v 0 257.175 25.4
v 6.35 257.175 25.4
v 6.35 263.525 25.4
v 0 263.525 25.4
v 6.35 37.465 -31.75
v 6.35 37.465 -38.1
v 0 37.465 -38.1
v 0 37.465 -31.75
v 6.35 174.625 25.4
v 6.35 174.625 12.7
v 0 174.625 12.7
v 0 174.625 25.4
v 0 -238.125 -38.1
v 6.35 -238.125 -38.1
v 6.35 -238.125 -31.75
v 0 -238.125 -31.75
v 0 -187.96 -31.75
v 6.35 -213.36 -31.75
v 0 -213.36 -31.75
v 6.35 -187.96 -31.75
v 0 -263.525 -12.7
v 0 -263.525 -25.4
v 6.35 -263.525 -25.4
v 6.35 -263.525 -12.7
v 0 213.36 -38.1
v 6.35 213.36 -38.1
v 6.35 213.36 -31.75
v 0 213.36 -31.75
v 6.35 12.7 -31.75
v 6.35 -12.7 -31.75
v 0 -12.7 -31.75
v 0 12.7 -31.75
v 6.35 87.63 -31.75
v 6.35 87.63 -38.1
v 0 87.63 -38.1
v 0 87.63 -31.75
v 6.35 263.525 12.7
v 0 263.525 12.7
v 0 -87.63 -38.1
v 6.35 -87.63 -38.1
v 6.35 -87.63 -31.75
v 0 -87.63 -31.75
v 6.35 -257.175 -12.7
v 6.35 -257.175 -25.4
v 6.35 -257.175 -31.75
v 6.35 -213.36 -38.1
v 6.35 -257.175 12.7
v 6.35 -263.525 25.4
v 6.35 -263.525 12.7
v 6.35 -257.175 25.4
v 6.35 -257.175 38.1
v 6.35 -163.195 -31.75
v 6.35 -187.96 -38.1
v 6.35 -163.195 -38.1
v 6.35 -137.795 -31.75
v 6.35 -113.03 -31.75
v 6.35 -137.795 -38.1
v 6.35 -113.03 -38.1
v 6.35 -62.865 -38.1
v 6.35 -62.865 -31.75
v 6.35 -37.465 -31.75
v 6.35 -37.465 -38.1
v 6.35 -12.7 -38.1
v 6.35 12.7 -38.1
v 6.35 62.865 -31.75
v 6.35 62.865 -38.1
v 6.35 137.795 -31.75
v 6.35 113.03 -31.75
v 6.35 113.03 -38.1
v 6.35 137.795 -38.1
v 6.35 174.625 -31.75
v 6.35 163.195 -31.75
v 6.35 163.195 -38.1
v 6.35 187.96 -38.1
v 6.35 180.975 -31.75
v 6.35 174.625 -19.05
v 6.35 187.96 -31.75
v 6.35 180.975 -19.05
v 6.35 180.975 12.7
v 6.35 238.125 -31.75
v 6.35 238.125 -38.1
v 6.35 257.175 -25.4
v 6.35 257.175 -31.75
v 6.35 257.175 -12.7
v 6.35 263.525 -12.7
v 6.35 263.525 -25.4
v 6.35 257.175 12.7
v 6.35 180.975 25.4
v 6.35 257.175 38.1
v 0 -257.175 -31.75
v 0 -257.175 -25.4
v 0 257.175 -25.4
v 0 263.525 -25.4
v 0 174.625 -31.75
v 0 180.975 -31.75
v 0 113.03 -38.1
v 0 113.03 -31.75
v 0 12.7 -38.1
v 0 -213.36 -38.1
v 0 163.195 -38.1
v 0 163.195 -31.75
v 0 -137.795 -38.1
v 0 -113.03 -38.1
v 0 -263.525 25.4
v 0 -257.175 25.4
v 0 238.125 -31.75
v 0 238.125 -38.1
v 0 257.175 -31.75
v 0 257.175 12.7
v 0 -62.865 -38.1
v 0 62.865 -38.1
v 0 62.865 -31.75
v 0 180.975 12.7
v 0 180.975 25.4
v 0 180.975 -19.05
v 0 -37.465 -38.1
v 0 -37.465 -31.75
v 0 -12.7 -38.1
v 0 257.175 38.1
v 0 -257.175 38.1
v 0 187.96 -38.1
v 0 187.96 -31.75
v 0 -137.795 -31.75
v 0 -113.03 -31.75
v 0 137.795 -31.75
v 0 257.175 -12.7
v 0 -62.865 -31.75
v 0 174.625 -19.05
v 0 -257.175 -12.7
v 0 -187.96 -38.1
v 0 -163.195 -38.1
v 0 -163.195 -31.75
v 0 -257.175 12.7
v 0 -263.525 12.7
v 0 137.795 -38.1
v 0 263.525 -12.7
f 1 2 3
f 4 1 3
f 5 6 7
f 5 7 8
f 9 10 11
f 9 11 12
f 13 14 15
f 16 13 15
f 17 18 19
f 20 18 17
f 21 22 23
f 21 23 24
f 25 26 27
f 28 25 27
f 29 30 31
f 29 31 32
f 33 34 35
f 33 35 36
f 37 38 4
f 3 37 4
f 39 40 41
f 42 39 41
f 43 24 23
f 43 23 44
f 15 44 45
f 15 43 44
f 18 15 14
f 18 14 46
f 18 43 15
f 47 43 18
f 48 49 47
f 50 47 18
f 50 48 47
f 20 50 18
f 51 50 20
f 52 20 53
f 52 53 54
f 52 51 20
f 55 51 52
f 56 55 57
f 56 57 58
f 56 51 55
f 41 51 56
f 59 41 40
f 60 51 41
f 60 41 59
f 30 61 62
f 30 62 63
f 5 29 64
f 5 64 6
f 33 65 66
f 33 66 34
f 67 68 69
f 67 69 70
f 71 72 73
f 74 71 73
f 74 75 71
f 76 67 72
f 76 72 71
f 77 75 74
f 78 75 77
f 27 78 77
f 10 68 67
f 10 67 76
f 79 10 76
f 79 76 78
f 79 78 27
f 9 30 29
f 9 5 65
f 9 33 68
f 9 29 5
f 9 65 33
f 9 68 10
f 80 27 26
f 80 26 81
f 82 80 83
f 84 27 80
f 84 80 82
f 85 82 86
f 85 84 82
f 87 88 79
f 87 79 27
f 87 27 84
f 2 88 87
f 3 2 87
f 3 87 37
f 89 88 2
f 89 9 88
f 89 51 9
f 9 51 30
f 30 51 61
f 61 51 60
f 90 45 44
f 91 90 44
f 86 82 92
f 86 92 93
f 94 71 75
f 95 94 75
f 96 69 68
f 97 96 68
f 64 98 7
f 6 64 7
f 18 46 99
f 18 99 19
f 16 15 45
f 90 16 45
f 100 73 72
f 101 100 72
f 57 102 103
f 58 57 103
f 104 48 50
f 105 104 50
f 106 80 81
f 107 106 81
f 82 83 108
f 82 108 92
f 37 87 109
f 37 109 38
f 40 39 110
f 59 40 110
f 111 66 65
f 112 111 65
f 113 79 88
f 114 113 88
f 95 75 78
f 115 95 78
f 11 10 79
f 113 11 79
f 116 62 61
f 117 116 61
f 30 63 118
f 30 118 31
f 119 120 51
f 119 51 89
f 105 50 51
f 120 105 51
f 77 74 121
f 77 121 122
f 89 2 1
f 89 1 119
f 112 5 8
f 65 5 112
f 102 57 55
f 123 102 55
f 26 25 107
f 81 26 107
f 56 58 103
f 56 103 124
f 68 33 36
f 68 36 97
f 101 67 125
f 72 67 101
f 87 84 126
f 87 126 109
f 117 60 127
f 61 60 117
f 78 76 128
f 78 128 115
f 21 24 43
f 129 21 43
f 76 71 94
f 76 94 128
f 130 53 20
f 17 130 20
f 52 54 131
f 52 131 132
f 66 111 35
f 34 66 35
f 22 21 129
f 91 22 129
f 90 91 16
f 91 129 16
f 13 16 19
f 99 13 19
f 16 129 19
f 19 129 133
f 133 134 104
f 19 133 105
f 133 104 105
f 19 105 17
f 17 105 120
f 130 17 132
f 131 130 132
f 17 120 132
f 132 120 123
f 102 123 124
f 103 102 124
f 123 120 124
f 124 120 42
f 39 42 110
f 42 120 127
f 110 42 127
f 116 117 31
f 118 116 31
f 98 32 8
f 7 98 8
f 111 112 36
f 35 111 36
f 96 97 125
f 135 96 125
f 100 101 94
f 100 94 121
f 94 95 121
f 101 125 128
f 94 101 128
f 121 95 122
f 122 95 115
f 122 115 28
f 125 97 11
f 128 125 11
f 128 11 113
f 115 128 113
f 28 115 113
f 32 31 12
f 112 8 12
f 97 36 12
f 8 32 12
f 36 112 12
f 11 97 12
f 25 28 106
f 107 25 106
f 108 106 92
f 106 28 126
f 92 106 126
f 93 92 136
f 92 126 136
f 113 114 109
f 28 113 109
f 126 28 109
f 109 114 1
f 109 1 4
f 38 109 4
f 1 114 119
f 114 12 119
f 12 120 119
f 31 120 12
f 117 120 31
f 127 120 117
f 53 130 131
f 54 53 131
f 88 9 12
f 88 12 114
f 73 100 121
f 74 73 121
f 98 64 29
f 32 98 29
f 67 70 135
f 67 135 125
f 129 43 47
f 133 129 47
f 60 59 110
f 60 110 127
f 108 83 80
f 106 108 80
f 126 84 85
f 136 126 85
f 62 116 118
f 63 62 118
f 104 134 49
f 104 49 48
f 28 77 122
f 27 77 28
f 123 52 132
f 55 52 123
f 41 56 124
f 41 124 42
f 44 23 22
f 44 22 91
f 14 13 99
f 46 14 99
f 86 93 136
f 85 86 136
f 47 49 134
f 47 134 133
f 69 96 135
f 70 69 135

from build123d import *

# Parameters (mm, degrees)
F0_W     = 527.05
F0_H     = 76.2
F1_DEPTH = 6.35
F2_W     = 6.35
F2_H     = 6.35
F2_W_2   = 25.4
F2_H_2   = 12.7
F2_H_3   = 25.4
F3_DEPTH = 6.35
F4_W     = 6.35
F4_H     = 12.7
F5_DEPTH = 25.4


with BuildPart() as f1:
    # F0 (on Right) → F1 (new body)
    with BuildSketch(Plane.YZ):
        Rectangle(F0_W, F0_H)
    extrude(amount=F1_DEPTH)

    # F2 (on face) → F3 (cut, through all)
    with BuildSketch(Plane.YZ.offset(6.35)):
        Polygon((-263.525, -31.75), (-263.525, -38.1), (-238.125, -38.1), (-238.125, -31.75), (-257.175, -31.75), align=None)
        with Locations((-260.35, -28.575)):
            Rectangle(F2_W, F2_H)
        with Locations((-200.66, -34.925)):
            Rectangle(F2_W_2, F2_H)
        with Locations((-150.495, -34.925)):
            Rectangle(F2_W_2, F2_H)
        with Locations((-100.33, -34.925)):
            Rectangle(F2_W_2, F2_H)
        with Locations((-50.165, -34.925)):
            Rectangle(F2_W_2, F2_H)
        with Locations((0, -34.925)):
            Rectangle(F2_W_2, F2_H)
        with Locations((50.165, -34.925)):
            Rectangle(F2_W_2, F2_H)
        with Locations((100.33, -34.925)):
            Rectangle(F2_W_2, F2_H)
        with Locations((150.495, -34.925)):
            Rectangle(F2_W_2, F2_H)
        with Locations((200.66, -34.925)):
            Rectangle(F2_W_2, F2_H)
        Polygon((238.125, -31.75), (238.125, -38.1), (263.525, -38.1), (263.525, -31.75), (257.175, -31.75), align=None)
        with Locations((260.35, -28.575)):
            Rectangle(F2_W, F2_H)
        with Locations((-260.35, 31.75)):
            Rectangle(F2_W, F2_H_2)
        with Locations((-260.35, 0)):
            Rectangle(F2_W, F2_H_3)
        with Locations((260.35, 31.75)):
            Rectangle(F2_W, F2_H_2)
        with Locations((260.35, 0)):
            Rectangle(F2_W, F2_H_3)
    extrude(amount=-F3_DEPTH, mode=Mode.SUBTRACT)

    # F4 (on face) → F5 (cut)
    with BuildSketch(Plane.YZ.offset(6.35)):
        with Locations((177.8, 19.05)):
            Rectangle(F4_W, F4_H)
        with Locations((177.8, -25.4)):
            Rectangle(F4_W, F4_H)
    extrude(amount=-F5_DEPTH, mode=Mode.SUBTRACT)


solid = f1.part
